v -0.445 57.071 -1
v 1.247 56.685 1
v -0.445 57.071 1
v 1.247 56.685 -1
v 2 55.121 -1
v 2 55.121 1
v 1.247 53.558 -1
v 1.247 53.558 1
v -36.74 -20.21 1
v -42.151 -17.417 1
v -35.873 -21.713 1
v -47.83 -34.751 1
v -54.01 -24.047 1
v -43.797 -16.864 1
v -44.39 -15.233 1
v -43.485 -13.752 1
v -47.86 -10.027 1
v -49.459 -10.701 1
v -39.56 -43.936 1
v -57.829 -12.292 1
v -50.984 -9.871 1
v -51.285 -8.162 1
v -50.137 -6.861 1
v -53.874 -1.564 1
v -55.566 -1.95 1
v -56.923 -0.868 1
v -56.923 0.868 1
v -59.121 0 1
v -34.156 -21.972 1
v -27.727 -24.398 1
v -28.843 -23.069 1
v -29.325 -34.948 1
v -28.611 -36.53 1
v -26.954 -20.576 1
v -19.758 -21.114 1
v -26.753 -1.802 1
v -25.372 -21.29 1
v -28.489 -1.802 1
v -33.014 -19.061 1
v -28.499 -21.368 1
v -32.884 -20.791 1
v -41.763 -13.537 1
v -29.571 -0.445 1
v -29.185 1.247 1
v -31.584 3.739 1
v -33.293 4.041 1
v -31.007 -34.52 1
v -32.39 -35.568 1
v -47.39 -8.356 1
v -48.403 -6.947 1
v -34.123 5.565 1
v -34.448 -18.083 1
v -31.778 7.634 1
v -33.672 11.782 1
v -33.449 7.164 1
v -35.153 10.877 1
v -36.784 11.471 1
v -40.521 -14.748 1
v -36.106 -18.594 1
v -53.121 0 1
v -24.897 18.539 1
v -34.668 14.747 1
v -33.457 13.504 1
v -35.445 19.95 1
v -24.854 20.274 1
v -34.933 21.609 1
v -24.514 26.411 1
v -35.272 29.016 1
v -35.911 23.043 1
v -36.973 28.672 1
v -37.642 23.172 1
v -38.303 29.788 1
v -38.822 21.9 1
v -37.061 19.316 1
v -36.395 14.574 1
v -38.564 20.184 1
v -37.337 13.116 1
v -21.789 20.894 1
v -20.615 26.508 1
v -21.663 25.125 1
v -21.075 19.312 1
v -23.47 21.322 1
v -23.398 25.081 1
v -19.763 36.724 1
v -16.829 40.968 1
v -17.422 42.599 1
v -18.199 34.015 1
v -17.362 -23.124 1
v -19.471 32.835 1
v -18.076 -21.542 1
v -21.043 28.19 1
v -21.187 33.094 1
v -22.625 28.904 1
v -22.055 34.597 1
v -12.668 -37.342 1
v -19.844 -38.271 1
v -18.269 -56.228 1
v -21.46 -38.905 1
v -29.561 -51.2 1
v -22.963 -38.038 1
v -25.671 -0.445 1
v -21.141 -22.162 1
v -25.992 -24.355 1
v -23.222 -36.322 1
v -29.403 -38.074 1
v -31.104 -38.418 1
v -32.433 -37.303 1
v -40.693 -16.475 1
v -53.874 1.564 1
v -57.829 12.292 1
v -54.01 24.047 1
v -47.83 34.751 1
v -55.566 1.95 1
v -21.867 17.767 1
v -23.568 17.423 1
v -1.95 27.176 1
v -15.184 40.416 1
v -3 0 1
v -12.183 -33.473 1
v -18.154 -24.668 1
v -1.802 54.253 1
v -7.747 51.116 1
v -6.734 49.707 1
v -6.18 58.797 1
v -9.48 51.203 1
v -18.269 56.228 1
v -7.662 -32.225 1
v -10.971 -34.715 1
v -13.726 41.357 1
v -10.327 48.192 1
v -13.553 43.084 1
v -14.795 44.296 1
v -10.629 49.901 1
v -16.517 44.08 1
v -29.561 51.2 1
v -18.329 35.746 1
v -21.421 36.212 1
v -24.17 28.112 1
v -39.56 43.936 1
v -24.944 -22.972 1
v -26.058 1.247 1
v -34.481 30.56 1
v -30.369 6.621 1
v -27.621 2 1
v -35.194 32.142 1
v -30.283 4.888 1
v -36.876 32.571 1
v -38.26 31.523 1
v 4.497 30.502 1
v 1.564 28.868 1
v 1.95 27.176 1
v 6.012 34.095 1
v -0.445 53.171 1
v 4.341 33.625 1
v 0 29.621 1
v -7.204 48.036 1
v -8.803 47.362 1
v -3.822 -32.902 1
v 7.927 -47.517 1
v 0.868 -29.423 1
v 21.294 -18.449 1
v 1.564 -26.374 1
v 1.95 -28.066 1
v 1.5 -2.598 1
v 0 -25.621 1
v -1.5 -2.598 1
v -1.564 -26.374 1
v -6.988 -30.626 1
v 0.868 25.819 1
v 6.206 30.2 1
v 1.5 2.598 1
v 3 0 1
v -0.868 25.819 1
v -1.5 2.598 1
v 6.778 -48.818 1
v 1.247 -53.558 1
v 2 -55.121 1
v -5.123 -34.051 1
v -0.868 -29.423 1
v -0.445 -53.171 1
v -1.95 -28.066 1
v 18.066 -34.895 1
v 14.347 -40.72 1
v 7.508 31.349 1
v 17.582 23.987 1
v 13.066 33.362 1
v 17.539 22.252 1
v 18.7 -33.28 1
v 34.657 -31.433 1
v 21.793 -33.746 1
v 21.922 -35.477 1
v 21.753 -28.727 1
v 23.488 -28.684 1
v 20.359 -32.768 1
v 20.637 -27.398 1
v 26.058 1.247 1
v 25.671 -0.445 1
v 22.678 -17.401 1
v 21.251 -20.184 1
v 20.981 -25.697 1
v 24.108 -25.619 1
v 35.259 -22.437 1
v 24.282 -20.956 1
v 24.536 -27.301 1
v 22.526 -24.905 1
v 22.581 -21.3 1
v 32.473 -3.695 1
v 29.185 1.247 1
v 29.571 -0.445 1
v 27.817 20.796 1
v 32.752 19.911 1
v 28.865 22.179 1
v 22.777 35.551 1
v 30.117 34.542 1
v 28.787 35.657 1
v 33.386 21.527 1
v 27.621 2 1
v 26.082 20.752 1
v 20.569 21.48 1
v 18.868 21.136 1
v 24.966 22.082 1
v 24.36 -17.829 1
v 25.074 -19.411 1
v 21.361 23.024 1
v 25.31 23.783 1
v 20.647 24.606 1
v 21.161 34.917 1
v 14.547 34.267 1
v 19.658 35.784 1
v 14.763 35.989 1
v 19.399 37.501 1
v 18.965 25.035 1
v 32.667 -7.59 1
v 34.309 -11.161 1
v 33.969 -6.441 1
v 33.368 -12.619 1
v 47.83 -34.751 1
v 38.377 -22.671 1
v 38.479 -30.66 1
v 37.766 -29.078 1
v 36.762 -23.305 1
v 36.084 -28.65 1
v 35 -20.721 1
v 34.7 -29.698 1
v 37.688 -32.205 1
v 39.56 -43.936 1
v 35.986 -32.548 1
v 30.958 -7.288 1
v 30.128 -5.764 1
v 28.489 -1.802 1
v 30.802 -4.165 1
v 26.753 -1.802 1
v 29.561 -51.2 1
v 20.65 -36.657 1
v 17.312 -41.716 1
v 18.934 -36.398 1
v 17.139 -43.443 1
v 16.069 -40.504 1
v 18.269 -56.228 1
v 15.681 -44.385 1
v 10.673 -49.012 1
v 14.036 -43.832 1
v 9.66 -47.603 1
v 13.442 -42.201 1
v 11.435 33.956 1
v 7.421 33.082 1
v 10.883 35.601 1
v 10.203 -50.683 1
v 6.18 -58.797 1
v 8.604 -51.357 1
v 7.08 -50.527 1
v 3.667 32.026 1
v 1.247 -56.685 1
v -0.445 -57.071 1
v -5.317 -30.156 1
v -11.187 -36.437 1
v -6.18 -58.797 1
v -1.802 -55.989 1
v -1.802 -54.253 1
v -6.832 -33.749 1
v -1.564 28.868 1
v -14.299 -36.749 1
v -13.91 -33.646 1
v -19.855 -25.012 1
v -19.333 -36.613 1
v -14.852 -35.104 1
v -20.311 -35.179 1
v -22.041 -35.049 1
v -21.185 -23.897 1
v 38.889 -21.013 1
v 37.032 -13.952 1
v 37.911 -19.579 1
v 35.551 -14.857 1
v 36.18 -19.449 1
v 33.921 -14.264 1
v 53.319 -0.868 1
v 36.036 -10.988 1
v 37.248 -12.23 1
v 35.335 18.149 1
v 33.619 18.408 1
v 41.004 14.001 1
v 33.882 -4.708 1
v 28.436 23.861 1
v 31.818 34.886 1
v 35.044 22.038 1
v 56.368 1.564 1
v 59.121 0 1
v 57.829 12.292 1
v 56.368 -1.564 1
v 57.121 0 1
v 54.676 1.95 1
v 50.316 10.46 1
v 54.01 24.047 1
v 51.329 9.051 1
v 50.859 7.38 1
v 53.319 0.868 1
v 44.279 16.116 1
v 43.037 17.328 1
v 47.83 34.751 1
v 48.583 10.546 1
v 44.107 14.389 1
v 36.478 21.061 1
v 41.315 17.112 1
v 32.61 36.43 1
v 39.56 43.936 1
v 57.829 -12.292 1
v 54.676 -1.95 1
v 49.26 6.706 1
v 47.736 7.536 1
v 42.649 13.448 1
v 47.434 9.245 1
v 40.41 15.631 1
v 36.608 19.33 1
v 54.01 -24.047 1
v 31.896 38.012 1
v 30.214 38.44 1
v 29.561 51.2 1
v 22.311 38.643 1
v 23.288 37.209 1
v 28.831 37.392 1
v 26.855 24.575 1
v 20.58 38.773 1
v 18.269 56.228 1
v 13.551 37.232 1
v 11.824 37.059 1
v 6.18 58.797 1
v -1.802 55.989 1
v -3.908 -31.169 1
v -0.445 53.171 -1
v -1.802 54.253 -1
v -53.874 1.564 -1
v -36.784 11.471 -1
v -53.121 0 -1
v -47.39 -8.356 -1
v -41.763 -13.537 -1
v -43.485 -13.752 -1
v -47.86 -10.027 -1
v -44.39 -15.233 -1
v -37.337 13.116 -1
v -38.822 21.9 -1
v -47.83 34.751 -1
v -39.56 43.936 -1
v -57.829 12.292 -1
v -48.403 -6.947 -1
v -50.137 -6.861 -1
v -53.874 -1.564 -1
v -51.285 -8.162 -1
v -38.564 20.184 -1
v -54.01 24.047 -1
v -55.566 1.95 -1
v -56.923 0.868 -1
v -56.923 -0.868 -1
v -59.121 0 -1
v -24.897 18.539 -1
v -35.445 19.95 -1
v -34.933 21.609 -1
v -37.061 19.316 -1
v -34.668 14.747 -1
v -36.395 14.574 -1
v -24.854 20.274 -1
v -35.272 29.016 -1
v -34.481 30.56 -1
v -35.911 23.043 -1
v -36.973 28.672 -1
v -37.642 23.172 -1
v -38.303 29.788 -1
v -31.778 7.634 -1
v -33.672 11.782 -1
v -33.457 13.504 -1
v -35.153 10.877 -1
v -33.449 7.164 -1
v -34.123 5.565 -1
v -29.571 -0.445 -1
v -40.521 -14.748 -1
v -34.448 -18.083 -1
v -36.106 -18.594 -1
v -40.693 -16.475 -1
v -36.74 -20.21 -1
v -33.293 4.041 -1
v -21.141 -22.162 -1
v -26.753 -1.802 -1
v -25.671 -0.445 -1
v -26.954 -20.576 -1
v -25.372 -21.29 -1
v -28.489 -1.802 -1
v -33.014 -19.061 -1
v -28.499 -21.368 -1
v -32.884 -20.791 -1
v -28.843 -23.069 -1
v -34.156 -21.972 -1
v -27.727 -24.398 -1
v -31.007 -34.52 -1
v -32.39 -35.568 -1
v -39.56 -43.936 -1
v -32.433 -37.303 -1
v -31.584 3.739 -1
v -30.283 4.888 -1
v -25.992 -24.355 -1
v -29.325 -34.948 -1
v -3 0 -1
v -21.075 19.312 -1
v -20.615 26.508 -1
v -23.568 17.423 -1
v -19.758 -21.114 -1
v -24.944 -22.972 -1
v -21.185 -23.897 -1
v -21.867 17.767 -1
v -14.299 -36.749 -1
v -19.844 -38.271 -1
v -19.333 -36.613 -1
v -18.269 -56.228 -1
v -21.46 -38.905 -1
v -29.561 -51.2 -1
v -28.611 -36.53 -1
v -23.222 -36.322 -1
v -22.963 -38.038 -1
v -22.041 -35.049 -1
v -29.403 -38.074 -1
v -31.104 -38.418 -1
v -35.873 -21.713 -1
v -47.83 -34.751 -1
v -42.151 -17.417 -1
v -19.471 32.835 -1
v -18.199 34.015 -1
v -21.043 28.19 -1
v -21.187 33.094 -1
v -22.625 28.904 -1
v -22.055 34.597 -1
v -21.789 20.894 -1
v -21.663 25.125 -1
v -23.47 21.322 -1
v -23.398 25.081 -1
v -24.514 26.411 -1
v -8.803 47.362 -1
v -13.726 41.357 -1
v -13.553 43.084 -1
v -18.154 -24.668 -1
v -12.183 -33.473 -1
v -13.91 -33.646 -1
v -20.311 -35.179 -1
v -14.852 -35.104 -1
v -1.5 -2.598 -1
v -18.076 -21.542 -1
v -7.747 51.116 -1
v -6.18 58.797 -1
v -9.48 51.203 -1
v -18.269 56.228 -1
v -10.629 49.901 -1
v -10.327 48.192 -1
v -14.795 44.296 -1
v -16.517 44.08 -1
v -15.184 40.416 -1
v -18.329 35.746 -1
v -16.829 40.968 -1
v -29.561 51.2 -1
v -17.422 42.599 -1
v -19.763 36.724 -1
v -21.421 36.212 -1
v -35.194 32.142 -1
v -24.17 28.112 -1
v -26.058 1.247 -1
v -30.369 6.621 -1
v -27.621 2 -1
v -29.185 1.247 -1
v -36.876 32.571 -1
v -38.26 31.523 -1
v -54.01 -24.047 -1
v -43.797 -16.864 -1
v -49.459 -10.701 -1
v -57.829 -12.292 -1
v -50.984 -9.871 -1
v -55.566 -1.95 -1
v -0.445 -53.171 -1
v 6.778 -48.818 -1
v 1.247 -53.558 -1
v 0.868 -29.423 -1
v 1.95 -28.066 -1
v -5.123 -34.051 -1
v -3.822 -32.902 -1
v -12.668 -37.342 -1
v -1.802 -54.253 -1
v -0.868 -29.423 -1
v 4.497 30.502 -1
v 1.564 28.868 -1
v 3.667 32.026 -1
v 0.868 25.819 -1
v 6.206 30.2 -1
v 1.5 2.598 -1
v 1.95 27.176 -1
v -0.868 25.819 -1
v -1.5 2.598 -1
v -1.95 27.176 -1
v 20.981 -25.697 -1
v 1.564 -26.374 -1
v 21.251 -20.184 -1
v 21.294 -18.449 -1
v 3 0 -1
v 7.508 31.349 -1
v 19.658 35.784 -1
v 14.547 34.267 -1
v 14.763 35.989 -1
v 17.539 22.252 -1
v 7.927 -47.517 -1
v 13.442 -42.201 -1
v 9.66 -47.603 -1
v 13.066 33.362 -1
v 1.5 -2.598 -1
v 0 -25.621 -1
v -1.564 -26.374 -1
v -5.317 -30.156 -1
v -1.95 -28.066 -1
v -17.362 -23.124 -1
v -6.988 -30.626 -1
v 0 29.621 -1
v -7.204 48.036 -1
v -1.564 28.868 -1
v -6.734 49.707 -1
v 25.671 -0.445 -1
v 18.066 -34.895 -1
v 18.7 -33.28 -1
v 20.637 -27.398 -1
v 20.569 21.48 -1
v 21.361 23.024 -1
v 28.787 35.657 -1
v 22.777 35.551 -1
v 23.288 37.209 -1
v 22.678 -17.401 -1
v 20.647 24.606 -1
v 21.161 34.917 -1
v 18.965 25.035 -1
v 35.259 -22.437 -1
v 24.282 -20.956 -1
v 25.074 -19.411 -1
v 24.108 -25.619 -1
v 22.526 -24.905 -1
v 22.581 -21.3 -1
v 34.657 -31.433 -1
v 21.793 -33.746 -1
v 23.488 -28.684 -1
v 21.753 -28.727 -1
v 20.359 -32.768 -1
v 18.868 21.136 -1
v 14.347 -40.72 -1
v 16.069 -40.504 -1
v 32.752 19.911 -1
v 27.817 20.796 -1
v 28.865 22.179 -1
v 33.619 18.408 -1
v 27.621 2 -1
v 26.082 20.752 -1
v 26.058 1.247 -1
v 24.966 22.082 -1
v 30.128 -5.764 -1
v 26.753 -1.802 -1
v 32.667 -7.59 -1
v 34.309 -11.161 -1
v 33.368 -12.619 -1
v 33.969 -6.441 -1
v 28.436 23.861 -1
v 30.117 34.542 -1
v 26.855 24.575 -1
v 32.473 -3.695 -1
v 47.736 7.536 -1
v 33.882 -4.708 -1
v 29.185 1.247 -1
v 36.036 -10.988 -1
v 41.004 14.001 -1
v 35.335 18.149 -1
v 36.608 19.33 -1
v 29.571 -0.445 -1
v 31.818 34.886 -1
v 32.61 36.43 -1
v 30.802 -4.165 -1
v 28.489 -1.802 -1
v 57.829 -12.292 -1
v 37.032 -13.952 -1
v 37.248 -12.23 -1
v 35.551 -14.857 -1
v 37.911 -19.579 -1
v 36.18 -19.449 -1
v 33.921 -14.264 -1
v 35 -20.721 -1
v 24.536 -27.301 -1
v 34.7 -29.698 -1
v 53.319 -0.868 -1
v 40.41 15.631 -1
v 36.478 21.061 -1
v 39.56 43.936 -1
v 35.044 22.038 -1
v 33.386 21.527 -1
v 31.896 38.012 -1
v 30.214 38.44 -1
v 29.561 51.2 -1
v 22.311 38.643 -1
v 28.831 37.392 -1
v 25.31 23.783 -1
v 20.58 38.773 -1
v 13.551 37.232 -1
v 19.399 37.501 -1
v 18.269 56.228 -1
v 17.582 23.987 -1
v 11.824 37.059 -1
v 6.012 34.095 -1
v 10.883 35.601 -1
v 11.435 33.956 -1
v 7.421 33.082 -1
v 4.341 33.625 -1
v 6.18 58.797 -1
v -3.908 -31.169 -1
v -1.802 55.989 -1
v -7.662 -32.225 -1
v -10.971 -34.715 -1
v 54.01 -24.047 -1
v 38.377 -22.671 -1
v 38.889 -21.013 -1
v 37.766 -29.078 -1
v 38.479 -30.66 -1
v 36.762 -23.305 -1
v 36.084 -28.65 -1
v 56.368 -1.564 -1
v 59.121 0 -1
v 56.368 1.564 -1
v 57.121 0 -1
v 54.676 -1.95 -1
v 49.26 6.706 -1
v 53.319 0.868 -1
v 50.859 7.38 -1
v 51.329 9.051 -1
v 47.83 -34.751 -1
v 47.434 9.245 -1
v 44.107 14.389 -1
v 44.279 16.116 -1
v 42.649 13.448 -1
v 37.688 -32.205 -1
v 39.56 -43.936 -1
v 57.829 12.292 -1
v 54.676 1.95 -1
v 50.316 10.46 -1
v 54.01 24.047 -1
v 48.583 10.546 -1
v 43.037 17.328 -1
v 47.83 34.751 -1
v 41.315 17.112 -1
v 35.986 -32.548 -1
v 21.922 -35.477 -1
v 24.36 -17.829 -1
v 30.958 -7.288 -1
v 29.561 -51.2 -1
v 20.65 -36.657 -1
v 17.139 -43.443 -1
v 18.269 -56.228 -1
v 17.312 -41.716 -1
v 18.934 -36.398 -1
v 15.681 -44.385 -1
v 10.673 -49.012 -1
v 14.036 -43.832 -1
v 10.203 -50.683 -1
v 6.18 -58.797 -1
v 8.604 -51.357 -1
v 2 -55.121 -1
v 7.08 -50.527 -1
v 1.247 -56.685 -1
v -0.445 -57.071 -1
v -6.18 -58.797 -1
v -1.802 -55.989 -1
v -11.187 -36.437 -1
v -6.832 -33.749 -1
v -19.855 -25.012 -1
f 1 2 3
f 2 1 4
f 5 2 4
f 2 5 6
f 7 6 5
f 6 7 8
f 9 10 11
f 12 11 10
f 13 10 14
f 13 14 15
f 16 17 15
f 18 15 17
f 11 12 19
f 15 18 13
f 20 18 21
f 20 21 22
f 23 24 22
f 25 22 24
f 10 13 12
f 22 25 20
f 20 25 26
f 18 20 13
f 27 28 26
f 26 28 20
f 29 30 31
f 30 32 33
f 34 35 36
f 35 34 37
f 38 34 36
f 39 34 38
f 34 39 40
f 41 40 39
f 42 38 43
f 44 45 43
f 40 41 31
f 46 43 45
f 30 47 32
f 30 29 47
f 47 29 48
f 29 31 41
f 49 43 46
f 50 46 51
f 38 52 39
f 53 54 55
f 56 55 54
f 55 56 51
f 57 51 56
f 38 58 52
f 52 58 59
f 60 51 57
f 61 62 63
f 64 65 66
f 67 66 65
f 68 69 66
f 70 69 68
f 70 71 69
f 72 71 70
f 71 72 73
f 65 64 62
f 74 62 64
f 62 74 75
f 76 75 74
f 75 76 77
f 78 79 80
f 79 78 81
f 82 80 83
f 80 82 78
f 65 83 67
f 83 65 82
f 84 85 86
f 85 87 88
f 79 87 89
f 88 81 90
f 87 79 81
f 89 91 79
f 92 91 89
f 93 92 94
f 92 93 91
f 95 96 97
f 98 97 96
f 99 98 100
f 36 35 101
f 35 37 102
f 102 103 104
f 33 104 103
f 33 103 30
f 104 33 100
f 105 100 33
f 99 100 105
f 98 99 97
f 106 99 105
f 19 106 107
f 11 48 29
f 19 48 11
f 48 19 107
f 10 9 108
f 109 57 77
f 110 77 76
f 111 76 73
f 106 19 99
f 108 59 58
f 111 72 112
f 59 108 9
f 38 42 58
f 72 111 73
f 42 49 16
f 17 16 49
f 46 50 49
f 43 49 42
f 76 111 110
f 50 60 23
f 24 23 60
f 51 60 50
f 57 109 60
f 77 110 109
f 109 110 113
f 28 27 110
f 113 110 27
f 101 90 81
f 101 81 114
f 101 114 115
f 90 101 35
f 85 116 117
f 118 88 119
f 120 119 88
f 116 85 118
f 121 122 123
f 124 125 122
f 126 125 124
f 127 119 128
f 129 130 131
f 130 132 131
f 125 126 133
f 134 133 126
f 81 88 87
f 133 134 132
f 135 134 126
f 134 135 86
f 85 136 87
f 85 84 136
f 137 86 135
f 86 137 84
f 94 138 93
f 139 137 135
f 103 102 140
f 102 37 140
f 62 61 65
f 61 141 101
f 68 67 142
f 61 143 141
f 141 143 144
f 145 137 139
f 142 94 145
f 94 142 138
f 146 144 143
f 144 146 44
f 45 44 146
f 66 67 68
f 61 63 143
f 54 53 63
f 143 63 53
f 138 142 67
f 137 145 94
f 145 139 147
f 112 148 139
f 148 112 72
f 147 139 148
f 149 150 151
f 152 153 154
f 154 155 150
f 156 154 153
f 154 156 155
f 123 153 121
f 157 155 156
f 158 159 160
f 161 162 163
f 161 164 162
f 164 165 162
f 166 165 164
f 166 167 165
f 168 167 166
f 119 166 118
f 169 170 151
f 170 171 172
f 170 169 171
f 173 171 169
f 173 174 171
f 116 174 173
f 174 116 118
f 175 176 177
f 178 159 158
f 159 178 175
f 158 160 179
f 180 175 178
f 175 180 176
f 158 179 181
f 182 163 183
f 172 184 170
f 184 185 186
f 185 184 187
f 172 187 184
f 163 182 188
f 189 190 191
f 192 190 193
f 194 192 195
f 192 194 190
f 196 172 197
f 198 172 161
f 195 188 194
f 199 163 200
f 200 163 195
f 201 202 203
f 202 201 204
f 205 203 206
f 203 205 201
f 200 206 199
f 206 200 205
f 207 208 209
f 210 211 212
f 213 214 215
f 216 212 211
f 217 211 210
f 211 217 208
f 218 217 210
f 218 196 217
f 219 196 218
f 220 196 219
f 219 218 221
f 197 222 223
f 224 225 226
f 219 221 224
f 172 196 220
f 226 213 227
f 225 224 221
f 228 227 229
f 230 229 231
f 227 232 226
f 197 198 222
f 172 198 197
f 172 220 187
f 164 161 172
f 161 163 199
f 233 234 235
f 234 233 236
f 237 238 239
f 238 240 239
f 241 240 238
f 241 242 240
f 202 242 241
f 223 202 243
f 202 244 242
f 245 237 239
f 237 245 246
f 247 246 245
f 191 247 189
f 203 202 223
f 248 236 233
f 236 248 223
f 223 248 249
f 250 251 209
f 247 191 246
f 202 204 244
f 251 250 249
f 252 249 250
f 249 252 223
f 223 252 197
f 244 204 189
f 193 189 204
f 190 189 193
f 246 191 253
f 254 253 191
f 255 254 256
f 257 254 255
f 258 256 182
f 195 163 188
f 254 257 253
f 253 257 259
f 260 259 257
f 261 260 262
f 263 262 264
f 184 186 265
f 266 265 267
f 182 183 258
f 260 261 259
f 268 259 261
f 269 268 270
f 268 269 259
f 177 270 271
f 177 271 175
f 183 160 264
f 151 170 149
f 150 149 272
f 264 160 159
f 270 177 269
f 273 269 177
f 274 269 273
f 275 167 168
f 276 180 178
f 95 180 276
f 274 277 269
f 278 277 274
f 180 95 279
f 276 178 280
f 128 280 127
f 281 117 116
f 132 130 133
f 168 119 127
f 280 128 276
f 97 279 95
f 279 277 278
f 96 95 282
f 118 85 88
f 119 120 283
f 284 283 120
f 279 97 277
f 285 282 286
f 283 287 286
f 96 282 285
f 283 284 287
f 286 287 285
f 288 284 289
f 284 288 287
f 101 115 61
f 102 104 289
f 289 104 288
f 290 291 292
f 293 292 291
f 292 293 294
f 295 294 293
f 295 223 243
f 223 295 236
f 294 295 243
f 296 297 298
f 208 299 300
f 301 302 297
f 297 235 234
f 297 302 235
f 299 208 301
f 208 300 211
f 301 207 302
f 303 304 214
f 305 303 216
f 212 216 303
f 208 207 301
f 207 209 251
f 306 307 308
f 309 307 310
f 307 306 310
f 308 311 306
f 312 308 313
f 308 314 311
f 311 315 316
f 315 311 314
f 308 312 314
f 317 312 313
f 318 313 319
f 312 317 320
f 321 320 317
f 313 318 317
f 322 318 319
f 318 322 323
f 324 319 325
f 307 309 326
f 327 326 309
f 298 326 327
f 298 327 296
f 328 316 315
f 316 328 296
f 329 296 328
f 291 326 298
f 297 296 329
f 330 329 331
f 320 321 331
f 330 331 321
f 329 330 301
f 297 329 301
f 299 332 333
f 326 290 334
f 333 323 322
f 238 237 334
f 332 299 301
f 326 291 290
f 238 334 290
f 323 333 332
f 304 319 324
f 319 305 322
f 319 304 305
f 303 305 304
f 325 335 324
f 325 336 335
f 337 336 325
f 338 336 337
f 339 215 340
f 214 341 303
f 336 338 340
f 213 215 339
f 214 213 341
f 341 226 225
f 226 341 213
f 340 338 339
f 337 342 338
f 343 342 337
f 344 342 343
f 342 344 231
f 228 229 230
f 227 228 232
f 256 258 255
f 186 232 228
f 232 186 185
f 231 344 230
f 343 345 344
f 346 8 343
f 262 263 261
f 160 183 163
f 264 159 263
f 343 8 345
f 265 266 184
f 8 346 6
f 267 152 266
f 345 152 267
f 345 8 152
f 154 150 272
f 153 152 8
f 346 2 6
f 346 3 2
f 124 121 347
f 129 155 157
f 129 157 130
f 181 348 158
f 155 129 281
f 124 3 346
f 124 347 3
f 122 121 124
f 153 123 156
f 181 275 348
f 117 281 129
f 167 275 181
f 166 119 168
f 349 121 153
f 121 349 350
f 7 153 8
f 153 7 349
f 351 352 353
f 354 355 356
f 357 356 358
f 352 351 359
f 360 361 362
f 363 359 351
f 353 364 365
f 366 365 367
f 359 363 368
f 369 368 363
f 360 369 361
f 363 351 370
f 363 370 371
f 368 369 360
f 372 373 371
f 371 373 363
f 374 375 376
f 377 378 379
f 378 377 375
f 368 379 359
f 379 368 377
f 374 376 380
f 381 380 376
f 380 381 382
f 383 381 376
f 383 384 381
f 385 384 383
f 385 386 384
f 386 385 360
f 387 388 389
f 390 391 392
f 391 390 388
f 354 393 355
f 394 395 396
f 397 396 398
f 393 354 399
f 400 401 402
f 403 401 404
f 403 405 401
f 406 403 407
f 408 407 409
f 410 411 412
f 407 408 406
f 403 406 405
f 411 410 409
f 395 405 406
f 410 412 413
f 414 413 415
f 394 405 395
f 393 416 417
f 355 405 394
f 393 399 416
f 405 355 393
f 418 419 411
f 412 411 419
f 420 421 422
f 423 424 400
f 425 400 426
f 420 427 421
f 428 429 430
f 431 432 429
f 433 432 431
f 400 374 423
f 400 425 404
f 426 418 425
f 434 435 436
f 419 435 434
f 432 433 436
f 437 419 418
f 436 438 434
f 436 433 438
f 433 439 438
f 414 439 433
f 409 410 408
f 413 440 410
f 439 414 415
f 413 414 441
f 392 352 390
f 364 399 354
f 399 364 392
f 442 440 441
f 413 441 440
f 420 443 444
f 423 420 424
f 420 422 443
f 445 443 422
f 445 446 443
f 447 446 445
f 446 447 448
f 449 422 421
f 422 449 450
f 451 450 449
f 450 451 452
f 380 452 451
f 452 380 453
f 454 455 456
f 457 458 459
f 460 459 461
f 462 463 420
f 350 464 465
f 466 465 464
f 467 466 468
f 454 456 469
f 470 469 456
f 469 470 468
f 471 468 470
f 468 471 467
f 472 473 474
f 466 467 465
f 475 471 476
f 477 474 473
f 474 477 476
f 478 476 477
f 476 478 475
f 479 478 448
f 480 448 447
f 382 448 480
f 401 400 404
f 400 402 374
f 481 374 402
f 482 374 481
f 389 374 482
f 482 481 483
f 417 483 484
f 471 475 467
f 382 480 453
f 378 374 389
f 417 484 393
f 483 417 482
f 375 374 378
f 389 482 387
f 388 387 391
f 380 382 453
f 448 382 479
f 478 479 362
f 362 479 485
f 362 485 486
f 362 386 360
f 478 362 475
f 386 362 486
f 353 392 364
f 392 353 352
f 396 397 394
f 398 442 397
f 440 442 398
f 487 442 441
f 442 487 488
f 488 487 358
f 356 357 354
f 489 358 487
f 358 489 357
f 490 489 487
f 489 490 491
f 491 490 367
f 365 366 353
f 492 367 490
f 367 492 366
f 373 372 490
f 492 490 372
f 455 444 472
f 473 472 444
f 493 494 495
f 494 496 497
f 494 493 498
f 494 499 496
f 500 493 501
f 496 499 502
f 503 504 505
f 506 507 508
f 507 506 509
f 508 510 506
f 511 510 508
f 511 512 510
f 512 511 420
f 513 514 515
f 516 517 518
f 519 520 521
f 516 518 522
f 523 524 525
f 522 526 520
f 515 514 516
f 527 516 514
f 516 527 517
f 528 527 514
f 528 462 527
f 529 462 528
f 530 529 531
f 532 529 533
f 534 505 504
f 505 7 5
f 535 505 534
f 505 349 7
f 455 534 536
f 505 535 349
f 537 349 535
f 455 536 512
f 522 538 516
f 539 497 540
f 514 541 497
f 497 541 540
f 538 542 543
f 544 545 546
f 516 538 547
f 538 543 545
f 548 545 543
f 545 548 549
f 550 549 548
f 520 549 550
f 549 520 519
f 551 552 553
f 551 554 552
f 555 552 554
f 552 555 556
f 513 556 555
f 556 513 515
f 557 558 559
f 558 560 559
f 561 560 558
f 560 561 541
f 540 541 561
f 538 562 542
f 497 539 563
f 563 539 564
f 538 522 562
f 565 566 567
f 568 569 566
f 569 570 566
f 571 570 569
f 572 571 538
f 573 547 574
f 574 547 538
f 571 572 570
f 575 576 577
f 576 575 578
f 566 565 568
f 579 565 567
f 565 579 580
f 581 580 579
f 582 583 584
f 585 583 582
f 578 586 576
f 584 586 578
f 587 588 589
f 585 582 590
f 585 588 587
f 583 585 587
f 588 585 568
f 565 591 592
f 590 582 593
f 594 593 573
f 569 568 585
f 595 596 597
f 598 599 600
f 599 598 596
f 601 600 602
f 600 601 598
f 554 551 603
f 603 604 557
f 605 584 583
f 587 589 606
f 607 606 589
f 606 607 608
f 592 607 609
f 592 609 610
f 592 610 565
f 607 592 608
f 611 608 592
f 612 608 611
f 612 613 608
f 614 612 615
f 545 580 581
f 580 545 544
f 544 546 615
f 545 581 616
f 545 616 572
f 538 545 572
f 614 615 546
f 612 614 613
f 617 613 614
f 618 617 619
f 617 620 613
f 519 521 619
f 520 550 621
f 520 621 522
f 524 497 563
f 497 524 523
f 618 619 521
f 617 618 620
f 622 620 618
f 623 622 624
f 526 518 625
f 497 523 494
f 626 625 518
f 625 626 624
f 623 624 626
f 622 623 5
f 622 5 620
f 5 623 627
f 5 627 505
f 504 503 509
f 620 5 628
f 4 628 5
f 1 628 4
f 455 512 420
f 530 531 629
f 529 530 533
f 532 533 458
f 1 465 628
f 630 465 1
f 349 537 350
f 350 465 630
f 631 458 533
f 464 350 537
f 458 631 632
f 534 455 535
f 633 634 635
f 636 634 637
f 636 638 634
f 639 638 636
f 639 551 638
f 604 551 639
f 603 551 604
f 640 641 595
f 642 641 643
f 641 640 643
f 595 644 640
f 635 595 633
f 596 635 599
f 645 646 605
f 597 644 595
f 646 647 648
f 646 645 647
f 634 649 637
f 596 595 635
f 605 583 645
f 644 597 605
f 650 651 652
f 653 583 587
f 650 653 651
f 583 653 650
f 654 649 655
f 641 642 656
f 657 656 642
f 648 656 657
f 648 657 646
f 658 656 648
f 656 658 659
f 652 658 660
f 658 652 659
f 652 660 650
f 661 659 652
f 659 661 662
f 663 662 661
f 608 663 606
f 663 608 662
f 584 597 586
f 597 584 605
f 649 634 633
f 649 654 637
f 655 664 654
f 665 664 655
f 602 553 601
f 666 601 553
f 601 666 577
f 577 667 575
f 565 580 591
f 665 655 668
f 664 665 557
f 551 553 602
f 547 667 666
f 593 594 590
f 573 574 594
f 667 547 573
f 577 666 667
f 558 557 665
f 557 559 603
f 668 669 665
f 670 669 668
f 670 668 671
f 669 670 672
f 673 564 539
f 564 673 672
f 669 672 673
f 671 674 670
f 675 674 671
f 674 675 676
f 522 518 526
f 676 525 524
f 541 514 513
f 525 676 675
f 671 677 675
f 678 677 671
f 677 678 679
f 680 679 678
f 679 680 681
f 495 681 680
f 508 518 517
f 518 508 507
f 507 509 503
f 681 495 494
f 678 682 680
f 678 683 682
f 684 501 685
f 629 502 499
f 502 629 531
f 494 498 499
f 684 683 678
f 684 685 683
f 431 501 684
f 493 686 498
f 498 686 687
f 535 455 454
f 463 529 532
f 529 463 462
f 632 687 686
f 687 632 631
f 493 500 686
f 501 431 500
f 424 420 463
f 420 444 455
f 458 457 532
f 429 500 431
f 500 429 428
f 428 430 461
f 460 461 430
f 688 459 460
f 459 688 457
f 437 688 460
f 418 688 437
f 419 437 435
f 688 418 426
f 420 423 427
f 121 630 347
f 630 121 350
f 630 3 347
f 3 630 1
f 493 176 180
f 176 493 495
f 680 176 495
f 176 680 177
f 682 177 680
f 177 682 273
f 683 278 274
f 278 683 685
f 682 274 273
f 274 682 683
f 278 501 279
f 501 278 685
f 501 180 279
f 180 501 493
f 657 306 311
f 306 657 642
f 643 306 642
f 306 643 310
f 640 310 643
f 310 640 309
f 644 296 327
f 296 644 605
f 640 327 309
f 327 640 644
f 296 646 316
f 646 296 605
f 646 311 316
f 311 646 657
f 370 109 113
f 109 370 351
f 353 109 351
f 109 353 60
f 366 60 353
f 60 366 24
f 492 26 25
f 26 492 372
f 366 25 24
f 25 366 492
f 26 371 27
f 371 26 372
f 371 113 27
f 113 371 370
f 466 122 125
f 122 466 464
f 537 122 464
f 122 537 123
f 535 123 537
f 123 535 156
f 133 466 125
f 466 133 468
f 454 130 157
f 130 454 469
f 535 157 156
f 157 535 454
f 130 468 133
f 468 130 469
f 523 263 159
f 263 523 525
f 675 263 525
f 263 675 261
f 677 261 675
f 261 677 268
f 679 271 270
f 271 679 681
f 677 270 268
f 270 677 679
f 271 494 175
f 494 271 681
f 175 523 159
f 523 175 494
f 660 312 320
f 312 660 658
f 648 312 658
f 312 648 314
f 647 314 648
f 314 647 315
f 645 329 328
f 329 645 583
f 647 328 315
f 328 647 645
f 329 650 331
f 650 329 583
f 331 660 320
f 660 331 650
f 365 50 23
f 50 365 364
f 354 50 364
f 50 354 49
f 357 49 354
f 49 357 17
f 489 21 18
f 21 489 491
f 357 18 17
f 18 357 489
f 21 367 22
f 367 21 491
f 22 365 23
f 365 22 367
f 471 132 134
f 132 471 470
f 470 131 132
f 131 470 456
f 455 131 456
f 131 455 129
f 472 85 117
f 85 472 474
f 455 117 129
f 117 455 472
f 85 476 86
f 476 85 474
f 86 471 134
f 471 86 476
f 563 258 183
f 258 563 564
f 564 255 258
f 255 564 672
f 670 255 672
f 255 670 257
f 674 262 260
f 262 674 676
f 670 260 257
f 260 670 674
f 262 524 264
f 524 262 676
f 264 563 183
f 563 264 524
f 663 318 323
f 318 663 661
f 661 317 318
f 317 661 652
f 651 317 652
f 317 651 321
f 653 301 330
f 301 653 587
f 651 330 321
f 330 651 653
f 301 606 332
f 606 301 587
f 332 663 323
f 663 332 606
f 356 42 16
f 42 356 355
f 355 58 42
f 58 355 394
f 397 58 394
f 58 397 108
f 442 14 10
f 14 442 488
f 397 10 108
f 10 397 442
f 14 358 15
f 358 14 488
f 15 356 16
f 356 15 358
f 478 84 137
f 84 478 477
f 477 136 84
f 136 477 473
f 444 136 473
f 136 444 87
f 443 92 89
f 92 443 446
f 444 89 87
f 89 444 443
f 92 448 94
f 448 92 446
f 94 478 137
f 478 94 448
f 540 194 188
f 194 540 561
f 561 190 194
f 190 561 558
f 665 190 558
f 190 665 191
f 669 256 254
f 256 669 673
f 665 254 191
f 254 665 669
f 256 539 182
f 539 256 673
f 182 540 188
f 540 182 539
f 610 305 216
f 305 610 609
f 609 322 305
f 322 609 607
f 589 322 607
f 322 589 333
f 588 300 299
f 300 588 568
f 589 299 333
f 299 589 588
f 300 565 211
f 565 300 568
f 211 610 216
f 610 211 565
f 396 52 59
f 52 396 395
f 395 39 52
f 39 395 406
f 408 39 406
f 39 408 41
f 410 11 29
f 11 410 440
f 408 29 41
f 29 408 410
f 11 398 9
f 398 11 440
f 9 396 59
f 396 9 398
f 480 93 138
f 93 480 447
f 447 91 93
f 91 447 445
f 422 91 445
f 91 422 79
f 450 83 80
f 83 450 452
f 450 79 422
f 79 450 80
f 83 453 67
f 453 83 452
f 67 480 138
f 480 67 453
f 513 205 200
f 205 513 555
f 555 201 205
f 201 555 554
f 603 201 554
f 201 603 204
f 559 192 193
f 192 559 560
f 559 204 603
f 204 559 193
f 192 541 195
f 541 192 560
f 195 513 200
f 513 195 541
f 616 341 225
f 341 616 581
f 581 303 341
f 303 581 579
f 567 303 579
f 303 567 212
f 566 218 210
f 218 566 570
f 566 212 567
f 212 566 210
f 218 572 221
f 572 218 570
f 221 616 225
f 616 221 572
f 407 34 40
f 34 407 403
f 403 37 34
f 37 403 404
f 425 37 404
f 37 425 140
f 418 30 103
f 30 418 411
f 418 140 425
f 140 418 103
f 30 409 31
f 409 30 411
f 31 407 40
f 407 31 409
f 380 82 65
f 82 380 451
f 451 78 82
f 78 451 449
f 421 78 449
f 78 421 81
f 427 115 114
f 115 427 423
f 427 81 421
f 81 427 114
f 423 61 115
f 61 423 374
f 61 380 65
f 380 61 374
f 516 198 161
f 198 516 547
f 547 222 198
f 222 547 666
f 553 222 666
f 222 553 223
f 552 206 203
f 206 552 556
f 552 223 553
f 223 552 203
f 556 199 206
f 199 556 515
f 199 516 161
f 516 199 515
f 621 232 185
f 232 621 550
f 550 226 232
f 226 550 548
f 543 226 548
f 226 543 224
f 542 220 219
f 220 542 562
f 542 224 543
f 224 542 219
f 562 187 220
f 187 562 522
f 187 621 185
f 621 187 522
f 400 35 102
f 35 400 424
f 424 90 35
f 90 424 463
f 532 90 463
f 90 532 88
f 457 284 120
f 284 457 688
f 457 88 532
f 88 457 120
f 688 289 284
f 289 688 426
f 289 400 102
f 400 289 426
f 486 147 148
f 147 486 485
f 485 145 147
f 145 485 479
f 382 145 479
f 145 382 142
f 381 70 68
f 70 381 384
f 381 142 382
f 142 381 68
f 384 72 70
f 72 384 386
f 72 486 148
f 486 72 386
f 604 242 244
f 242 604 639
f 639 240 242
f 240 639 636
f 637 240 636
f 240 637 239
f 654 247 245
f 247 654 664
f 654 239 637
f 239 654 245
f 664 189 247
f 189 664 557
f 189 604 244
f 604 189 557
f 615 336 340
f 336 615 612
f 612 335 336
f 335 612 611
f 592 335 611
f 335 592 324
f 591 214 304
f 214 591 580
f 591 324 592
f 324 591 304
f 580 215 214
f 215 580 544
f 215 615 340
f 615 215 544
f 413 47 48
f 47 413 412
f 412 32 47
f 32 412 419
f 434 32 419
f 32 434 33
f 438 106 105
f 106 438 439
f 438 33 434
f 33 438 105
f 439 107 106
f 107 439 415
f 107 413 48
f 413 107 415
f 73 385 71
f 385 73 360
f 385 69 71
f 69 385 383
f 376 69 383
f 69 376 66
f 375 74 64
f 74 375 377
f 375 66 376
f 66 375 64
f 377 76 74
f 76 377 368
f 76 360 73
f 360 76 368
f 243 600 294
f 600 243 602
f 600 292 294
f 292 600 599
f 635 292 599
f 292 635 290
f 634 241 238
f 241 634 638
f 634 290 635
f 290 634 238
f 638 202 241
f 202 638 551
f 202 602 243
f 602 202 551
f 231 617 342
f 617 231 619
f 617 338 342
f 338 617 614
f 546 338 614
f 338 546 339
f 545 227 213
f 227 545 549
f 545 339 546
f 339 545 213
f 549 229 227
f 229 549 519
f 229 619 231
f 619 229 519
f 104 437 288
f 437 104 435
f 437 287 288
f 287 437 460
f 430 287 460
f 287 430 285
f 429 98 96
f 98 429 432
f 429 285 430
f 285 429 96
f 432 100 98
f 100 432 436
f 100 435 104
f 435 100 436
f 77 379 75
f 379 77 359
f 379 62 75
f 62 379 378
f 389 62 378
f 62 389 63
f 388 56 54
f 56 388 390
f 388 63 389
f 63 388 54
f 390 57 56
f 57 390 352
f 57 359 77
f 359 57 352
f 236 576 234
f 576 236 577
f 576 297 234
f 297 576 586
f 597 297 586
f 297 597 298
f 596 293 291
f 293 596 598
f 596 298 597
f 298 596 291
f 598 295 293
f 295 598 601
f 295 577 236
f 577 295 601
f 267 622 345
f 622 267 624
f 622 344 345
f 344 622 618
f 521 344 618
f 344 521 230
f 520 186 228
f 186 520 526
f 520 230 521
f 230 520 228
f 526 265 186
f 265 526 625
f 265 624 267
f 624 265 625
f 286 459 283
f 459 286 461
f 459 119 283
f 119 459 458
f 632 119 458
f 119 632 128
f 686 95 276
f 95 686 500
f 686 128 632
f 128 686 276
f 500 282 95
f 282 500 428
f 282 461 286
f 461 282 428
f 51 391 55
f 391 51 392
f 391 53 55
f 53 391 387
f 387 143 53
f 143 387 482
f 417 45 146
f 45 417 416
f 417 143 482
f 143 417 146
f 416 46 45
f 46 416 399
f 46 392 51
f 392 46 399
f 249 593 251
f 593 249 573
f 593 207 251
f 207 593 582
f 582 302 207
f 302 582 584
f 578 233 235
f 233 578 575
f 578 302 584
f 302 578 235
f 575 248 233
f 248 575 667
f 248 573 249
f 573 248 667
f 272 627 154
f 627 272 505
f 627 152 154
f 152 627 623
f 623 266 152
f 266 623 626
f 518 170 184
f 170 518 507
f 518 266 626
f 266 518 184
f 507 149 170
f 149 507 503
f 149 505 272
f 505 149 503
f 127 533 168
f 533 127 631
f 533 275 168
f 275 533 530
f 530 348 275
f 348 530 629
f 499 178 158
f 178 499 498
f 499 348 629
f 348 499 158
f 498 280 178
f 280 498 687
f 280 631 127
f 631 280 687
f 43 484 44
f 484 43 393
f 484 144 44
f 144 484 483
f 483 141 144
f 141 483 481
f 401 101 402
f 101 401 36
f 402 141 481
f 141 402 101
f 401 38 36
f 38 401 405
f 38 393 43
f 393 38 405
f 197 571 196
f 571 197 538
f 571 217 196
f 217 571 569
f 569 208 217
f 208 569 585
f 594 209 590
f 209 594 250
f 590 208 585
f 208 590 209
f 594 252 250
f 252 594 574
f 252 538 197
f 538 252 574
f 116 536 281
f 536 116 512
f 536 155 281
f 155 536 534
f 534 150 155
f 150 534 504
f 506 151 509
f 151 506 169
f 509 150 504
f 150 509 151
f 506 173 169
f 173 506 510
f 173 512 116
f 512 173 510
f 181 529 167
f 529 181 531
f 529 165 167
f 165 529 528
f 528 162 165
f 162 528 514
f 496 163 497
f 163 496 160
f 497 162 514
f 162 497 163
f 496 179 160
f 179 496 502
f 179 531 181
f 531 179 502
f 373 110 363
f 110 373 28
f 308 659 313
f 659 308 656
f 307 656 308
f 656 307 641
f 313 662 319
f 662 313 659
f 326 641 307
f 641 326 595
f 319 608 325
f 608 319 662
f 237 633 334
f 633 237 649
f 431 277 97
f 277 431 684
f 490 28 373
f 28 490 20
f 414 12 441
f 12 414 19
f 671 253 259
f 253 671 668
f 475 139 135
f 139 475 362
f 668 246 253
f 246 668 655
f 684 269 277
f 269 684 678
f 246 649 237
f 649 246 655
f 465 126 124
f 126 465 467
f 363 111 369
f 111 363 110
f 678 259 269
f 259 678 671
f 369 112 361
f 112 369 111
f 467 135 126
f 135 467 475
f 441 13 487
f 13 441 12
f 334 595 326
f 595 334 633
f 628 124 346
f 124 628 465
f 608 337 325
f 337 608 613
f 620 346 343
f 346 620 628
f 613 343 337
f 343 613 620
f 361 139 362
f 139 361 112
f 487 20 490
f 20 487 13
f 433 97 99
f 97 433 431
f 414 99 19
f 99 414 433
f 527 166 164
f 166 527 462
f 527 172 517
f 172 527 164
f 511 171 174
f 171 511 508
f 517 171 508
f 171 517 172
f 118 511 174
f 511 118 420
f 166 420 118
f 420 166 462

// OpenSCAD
pump_inner_d=125;
tube_squish_w=25;
rim_h=tube_squish_w*1.5;
tol=1;
dia=sqrt(pow(pump_inner_d/2,2)-pow(rim_h/2,2))*2-tol;//119.2
hole=2;
thickness=2;
drive=6;

module screwpattern(offset){
	translate([0,(dia/2-hole*2)-offset,0]){cylinder(h=thickness,r=hole,center=true);}	
	translate([0,-(dia/2-hole*2)+offset,0]){cylinder(h=thickness,r=hole,center=true);}
	translate([(dia/2-hole*2)-offset,0,0]){cylinder(h=thickness,r=hole,center=true);}
	translate([-(dia/2-hole*2)+offset,0,0]){cylinder(h=thickness,r=hole,center=true);}
}


module pumpdrive(){
	os = 5;
	difference(){
		cylinder(h=thickness,d=dia,center=true);
		cylinder(d=drive,h=thickness,center=true,$fn=6);
		screwpattern(0);
		rotate(10,0,0){screwpattern(os);}
		rotate(20,0,0){screwpattern(os*2);}
		rotate(30,0,0){screwpattern(os*3);}
		rotate(40,0,0){screwpattern(os*4);}
		rotate(50,0,0){screwpattern(os*5);}
		
		rotate(50,0,0){screwpattern(os*1.5);}
		rotate(60,0,0){screwpattern(os*2.5);}
		rotate(70,0,0){screwpattern(os*3.5);}
		rotate(80,0,0){screwpattern(os*4.5);}
		rotate(90,0,0){screwpattern(os*5.5);}
	}
}
pumpdrive();
